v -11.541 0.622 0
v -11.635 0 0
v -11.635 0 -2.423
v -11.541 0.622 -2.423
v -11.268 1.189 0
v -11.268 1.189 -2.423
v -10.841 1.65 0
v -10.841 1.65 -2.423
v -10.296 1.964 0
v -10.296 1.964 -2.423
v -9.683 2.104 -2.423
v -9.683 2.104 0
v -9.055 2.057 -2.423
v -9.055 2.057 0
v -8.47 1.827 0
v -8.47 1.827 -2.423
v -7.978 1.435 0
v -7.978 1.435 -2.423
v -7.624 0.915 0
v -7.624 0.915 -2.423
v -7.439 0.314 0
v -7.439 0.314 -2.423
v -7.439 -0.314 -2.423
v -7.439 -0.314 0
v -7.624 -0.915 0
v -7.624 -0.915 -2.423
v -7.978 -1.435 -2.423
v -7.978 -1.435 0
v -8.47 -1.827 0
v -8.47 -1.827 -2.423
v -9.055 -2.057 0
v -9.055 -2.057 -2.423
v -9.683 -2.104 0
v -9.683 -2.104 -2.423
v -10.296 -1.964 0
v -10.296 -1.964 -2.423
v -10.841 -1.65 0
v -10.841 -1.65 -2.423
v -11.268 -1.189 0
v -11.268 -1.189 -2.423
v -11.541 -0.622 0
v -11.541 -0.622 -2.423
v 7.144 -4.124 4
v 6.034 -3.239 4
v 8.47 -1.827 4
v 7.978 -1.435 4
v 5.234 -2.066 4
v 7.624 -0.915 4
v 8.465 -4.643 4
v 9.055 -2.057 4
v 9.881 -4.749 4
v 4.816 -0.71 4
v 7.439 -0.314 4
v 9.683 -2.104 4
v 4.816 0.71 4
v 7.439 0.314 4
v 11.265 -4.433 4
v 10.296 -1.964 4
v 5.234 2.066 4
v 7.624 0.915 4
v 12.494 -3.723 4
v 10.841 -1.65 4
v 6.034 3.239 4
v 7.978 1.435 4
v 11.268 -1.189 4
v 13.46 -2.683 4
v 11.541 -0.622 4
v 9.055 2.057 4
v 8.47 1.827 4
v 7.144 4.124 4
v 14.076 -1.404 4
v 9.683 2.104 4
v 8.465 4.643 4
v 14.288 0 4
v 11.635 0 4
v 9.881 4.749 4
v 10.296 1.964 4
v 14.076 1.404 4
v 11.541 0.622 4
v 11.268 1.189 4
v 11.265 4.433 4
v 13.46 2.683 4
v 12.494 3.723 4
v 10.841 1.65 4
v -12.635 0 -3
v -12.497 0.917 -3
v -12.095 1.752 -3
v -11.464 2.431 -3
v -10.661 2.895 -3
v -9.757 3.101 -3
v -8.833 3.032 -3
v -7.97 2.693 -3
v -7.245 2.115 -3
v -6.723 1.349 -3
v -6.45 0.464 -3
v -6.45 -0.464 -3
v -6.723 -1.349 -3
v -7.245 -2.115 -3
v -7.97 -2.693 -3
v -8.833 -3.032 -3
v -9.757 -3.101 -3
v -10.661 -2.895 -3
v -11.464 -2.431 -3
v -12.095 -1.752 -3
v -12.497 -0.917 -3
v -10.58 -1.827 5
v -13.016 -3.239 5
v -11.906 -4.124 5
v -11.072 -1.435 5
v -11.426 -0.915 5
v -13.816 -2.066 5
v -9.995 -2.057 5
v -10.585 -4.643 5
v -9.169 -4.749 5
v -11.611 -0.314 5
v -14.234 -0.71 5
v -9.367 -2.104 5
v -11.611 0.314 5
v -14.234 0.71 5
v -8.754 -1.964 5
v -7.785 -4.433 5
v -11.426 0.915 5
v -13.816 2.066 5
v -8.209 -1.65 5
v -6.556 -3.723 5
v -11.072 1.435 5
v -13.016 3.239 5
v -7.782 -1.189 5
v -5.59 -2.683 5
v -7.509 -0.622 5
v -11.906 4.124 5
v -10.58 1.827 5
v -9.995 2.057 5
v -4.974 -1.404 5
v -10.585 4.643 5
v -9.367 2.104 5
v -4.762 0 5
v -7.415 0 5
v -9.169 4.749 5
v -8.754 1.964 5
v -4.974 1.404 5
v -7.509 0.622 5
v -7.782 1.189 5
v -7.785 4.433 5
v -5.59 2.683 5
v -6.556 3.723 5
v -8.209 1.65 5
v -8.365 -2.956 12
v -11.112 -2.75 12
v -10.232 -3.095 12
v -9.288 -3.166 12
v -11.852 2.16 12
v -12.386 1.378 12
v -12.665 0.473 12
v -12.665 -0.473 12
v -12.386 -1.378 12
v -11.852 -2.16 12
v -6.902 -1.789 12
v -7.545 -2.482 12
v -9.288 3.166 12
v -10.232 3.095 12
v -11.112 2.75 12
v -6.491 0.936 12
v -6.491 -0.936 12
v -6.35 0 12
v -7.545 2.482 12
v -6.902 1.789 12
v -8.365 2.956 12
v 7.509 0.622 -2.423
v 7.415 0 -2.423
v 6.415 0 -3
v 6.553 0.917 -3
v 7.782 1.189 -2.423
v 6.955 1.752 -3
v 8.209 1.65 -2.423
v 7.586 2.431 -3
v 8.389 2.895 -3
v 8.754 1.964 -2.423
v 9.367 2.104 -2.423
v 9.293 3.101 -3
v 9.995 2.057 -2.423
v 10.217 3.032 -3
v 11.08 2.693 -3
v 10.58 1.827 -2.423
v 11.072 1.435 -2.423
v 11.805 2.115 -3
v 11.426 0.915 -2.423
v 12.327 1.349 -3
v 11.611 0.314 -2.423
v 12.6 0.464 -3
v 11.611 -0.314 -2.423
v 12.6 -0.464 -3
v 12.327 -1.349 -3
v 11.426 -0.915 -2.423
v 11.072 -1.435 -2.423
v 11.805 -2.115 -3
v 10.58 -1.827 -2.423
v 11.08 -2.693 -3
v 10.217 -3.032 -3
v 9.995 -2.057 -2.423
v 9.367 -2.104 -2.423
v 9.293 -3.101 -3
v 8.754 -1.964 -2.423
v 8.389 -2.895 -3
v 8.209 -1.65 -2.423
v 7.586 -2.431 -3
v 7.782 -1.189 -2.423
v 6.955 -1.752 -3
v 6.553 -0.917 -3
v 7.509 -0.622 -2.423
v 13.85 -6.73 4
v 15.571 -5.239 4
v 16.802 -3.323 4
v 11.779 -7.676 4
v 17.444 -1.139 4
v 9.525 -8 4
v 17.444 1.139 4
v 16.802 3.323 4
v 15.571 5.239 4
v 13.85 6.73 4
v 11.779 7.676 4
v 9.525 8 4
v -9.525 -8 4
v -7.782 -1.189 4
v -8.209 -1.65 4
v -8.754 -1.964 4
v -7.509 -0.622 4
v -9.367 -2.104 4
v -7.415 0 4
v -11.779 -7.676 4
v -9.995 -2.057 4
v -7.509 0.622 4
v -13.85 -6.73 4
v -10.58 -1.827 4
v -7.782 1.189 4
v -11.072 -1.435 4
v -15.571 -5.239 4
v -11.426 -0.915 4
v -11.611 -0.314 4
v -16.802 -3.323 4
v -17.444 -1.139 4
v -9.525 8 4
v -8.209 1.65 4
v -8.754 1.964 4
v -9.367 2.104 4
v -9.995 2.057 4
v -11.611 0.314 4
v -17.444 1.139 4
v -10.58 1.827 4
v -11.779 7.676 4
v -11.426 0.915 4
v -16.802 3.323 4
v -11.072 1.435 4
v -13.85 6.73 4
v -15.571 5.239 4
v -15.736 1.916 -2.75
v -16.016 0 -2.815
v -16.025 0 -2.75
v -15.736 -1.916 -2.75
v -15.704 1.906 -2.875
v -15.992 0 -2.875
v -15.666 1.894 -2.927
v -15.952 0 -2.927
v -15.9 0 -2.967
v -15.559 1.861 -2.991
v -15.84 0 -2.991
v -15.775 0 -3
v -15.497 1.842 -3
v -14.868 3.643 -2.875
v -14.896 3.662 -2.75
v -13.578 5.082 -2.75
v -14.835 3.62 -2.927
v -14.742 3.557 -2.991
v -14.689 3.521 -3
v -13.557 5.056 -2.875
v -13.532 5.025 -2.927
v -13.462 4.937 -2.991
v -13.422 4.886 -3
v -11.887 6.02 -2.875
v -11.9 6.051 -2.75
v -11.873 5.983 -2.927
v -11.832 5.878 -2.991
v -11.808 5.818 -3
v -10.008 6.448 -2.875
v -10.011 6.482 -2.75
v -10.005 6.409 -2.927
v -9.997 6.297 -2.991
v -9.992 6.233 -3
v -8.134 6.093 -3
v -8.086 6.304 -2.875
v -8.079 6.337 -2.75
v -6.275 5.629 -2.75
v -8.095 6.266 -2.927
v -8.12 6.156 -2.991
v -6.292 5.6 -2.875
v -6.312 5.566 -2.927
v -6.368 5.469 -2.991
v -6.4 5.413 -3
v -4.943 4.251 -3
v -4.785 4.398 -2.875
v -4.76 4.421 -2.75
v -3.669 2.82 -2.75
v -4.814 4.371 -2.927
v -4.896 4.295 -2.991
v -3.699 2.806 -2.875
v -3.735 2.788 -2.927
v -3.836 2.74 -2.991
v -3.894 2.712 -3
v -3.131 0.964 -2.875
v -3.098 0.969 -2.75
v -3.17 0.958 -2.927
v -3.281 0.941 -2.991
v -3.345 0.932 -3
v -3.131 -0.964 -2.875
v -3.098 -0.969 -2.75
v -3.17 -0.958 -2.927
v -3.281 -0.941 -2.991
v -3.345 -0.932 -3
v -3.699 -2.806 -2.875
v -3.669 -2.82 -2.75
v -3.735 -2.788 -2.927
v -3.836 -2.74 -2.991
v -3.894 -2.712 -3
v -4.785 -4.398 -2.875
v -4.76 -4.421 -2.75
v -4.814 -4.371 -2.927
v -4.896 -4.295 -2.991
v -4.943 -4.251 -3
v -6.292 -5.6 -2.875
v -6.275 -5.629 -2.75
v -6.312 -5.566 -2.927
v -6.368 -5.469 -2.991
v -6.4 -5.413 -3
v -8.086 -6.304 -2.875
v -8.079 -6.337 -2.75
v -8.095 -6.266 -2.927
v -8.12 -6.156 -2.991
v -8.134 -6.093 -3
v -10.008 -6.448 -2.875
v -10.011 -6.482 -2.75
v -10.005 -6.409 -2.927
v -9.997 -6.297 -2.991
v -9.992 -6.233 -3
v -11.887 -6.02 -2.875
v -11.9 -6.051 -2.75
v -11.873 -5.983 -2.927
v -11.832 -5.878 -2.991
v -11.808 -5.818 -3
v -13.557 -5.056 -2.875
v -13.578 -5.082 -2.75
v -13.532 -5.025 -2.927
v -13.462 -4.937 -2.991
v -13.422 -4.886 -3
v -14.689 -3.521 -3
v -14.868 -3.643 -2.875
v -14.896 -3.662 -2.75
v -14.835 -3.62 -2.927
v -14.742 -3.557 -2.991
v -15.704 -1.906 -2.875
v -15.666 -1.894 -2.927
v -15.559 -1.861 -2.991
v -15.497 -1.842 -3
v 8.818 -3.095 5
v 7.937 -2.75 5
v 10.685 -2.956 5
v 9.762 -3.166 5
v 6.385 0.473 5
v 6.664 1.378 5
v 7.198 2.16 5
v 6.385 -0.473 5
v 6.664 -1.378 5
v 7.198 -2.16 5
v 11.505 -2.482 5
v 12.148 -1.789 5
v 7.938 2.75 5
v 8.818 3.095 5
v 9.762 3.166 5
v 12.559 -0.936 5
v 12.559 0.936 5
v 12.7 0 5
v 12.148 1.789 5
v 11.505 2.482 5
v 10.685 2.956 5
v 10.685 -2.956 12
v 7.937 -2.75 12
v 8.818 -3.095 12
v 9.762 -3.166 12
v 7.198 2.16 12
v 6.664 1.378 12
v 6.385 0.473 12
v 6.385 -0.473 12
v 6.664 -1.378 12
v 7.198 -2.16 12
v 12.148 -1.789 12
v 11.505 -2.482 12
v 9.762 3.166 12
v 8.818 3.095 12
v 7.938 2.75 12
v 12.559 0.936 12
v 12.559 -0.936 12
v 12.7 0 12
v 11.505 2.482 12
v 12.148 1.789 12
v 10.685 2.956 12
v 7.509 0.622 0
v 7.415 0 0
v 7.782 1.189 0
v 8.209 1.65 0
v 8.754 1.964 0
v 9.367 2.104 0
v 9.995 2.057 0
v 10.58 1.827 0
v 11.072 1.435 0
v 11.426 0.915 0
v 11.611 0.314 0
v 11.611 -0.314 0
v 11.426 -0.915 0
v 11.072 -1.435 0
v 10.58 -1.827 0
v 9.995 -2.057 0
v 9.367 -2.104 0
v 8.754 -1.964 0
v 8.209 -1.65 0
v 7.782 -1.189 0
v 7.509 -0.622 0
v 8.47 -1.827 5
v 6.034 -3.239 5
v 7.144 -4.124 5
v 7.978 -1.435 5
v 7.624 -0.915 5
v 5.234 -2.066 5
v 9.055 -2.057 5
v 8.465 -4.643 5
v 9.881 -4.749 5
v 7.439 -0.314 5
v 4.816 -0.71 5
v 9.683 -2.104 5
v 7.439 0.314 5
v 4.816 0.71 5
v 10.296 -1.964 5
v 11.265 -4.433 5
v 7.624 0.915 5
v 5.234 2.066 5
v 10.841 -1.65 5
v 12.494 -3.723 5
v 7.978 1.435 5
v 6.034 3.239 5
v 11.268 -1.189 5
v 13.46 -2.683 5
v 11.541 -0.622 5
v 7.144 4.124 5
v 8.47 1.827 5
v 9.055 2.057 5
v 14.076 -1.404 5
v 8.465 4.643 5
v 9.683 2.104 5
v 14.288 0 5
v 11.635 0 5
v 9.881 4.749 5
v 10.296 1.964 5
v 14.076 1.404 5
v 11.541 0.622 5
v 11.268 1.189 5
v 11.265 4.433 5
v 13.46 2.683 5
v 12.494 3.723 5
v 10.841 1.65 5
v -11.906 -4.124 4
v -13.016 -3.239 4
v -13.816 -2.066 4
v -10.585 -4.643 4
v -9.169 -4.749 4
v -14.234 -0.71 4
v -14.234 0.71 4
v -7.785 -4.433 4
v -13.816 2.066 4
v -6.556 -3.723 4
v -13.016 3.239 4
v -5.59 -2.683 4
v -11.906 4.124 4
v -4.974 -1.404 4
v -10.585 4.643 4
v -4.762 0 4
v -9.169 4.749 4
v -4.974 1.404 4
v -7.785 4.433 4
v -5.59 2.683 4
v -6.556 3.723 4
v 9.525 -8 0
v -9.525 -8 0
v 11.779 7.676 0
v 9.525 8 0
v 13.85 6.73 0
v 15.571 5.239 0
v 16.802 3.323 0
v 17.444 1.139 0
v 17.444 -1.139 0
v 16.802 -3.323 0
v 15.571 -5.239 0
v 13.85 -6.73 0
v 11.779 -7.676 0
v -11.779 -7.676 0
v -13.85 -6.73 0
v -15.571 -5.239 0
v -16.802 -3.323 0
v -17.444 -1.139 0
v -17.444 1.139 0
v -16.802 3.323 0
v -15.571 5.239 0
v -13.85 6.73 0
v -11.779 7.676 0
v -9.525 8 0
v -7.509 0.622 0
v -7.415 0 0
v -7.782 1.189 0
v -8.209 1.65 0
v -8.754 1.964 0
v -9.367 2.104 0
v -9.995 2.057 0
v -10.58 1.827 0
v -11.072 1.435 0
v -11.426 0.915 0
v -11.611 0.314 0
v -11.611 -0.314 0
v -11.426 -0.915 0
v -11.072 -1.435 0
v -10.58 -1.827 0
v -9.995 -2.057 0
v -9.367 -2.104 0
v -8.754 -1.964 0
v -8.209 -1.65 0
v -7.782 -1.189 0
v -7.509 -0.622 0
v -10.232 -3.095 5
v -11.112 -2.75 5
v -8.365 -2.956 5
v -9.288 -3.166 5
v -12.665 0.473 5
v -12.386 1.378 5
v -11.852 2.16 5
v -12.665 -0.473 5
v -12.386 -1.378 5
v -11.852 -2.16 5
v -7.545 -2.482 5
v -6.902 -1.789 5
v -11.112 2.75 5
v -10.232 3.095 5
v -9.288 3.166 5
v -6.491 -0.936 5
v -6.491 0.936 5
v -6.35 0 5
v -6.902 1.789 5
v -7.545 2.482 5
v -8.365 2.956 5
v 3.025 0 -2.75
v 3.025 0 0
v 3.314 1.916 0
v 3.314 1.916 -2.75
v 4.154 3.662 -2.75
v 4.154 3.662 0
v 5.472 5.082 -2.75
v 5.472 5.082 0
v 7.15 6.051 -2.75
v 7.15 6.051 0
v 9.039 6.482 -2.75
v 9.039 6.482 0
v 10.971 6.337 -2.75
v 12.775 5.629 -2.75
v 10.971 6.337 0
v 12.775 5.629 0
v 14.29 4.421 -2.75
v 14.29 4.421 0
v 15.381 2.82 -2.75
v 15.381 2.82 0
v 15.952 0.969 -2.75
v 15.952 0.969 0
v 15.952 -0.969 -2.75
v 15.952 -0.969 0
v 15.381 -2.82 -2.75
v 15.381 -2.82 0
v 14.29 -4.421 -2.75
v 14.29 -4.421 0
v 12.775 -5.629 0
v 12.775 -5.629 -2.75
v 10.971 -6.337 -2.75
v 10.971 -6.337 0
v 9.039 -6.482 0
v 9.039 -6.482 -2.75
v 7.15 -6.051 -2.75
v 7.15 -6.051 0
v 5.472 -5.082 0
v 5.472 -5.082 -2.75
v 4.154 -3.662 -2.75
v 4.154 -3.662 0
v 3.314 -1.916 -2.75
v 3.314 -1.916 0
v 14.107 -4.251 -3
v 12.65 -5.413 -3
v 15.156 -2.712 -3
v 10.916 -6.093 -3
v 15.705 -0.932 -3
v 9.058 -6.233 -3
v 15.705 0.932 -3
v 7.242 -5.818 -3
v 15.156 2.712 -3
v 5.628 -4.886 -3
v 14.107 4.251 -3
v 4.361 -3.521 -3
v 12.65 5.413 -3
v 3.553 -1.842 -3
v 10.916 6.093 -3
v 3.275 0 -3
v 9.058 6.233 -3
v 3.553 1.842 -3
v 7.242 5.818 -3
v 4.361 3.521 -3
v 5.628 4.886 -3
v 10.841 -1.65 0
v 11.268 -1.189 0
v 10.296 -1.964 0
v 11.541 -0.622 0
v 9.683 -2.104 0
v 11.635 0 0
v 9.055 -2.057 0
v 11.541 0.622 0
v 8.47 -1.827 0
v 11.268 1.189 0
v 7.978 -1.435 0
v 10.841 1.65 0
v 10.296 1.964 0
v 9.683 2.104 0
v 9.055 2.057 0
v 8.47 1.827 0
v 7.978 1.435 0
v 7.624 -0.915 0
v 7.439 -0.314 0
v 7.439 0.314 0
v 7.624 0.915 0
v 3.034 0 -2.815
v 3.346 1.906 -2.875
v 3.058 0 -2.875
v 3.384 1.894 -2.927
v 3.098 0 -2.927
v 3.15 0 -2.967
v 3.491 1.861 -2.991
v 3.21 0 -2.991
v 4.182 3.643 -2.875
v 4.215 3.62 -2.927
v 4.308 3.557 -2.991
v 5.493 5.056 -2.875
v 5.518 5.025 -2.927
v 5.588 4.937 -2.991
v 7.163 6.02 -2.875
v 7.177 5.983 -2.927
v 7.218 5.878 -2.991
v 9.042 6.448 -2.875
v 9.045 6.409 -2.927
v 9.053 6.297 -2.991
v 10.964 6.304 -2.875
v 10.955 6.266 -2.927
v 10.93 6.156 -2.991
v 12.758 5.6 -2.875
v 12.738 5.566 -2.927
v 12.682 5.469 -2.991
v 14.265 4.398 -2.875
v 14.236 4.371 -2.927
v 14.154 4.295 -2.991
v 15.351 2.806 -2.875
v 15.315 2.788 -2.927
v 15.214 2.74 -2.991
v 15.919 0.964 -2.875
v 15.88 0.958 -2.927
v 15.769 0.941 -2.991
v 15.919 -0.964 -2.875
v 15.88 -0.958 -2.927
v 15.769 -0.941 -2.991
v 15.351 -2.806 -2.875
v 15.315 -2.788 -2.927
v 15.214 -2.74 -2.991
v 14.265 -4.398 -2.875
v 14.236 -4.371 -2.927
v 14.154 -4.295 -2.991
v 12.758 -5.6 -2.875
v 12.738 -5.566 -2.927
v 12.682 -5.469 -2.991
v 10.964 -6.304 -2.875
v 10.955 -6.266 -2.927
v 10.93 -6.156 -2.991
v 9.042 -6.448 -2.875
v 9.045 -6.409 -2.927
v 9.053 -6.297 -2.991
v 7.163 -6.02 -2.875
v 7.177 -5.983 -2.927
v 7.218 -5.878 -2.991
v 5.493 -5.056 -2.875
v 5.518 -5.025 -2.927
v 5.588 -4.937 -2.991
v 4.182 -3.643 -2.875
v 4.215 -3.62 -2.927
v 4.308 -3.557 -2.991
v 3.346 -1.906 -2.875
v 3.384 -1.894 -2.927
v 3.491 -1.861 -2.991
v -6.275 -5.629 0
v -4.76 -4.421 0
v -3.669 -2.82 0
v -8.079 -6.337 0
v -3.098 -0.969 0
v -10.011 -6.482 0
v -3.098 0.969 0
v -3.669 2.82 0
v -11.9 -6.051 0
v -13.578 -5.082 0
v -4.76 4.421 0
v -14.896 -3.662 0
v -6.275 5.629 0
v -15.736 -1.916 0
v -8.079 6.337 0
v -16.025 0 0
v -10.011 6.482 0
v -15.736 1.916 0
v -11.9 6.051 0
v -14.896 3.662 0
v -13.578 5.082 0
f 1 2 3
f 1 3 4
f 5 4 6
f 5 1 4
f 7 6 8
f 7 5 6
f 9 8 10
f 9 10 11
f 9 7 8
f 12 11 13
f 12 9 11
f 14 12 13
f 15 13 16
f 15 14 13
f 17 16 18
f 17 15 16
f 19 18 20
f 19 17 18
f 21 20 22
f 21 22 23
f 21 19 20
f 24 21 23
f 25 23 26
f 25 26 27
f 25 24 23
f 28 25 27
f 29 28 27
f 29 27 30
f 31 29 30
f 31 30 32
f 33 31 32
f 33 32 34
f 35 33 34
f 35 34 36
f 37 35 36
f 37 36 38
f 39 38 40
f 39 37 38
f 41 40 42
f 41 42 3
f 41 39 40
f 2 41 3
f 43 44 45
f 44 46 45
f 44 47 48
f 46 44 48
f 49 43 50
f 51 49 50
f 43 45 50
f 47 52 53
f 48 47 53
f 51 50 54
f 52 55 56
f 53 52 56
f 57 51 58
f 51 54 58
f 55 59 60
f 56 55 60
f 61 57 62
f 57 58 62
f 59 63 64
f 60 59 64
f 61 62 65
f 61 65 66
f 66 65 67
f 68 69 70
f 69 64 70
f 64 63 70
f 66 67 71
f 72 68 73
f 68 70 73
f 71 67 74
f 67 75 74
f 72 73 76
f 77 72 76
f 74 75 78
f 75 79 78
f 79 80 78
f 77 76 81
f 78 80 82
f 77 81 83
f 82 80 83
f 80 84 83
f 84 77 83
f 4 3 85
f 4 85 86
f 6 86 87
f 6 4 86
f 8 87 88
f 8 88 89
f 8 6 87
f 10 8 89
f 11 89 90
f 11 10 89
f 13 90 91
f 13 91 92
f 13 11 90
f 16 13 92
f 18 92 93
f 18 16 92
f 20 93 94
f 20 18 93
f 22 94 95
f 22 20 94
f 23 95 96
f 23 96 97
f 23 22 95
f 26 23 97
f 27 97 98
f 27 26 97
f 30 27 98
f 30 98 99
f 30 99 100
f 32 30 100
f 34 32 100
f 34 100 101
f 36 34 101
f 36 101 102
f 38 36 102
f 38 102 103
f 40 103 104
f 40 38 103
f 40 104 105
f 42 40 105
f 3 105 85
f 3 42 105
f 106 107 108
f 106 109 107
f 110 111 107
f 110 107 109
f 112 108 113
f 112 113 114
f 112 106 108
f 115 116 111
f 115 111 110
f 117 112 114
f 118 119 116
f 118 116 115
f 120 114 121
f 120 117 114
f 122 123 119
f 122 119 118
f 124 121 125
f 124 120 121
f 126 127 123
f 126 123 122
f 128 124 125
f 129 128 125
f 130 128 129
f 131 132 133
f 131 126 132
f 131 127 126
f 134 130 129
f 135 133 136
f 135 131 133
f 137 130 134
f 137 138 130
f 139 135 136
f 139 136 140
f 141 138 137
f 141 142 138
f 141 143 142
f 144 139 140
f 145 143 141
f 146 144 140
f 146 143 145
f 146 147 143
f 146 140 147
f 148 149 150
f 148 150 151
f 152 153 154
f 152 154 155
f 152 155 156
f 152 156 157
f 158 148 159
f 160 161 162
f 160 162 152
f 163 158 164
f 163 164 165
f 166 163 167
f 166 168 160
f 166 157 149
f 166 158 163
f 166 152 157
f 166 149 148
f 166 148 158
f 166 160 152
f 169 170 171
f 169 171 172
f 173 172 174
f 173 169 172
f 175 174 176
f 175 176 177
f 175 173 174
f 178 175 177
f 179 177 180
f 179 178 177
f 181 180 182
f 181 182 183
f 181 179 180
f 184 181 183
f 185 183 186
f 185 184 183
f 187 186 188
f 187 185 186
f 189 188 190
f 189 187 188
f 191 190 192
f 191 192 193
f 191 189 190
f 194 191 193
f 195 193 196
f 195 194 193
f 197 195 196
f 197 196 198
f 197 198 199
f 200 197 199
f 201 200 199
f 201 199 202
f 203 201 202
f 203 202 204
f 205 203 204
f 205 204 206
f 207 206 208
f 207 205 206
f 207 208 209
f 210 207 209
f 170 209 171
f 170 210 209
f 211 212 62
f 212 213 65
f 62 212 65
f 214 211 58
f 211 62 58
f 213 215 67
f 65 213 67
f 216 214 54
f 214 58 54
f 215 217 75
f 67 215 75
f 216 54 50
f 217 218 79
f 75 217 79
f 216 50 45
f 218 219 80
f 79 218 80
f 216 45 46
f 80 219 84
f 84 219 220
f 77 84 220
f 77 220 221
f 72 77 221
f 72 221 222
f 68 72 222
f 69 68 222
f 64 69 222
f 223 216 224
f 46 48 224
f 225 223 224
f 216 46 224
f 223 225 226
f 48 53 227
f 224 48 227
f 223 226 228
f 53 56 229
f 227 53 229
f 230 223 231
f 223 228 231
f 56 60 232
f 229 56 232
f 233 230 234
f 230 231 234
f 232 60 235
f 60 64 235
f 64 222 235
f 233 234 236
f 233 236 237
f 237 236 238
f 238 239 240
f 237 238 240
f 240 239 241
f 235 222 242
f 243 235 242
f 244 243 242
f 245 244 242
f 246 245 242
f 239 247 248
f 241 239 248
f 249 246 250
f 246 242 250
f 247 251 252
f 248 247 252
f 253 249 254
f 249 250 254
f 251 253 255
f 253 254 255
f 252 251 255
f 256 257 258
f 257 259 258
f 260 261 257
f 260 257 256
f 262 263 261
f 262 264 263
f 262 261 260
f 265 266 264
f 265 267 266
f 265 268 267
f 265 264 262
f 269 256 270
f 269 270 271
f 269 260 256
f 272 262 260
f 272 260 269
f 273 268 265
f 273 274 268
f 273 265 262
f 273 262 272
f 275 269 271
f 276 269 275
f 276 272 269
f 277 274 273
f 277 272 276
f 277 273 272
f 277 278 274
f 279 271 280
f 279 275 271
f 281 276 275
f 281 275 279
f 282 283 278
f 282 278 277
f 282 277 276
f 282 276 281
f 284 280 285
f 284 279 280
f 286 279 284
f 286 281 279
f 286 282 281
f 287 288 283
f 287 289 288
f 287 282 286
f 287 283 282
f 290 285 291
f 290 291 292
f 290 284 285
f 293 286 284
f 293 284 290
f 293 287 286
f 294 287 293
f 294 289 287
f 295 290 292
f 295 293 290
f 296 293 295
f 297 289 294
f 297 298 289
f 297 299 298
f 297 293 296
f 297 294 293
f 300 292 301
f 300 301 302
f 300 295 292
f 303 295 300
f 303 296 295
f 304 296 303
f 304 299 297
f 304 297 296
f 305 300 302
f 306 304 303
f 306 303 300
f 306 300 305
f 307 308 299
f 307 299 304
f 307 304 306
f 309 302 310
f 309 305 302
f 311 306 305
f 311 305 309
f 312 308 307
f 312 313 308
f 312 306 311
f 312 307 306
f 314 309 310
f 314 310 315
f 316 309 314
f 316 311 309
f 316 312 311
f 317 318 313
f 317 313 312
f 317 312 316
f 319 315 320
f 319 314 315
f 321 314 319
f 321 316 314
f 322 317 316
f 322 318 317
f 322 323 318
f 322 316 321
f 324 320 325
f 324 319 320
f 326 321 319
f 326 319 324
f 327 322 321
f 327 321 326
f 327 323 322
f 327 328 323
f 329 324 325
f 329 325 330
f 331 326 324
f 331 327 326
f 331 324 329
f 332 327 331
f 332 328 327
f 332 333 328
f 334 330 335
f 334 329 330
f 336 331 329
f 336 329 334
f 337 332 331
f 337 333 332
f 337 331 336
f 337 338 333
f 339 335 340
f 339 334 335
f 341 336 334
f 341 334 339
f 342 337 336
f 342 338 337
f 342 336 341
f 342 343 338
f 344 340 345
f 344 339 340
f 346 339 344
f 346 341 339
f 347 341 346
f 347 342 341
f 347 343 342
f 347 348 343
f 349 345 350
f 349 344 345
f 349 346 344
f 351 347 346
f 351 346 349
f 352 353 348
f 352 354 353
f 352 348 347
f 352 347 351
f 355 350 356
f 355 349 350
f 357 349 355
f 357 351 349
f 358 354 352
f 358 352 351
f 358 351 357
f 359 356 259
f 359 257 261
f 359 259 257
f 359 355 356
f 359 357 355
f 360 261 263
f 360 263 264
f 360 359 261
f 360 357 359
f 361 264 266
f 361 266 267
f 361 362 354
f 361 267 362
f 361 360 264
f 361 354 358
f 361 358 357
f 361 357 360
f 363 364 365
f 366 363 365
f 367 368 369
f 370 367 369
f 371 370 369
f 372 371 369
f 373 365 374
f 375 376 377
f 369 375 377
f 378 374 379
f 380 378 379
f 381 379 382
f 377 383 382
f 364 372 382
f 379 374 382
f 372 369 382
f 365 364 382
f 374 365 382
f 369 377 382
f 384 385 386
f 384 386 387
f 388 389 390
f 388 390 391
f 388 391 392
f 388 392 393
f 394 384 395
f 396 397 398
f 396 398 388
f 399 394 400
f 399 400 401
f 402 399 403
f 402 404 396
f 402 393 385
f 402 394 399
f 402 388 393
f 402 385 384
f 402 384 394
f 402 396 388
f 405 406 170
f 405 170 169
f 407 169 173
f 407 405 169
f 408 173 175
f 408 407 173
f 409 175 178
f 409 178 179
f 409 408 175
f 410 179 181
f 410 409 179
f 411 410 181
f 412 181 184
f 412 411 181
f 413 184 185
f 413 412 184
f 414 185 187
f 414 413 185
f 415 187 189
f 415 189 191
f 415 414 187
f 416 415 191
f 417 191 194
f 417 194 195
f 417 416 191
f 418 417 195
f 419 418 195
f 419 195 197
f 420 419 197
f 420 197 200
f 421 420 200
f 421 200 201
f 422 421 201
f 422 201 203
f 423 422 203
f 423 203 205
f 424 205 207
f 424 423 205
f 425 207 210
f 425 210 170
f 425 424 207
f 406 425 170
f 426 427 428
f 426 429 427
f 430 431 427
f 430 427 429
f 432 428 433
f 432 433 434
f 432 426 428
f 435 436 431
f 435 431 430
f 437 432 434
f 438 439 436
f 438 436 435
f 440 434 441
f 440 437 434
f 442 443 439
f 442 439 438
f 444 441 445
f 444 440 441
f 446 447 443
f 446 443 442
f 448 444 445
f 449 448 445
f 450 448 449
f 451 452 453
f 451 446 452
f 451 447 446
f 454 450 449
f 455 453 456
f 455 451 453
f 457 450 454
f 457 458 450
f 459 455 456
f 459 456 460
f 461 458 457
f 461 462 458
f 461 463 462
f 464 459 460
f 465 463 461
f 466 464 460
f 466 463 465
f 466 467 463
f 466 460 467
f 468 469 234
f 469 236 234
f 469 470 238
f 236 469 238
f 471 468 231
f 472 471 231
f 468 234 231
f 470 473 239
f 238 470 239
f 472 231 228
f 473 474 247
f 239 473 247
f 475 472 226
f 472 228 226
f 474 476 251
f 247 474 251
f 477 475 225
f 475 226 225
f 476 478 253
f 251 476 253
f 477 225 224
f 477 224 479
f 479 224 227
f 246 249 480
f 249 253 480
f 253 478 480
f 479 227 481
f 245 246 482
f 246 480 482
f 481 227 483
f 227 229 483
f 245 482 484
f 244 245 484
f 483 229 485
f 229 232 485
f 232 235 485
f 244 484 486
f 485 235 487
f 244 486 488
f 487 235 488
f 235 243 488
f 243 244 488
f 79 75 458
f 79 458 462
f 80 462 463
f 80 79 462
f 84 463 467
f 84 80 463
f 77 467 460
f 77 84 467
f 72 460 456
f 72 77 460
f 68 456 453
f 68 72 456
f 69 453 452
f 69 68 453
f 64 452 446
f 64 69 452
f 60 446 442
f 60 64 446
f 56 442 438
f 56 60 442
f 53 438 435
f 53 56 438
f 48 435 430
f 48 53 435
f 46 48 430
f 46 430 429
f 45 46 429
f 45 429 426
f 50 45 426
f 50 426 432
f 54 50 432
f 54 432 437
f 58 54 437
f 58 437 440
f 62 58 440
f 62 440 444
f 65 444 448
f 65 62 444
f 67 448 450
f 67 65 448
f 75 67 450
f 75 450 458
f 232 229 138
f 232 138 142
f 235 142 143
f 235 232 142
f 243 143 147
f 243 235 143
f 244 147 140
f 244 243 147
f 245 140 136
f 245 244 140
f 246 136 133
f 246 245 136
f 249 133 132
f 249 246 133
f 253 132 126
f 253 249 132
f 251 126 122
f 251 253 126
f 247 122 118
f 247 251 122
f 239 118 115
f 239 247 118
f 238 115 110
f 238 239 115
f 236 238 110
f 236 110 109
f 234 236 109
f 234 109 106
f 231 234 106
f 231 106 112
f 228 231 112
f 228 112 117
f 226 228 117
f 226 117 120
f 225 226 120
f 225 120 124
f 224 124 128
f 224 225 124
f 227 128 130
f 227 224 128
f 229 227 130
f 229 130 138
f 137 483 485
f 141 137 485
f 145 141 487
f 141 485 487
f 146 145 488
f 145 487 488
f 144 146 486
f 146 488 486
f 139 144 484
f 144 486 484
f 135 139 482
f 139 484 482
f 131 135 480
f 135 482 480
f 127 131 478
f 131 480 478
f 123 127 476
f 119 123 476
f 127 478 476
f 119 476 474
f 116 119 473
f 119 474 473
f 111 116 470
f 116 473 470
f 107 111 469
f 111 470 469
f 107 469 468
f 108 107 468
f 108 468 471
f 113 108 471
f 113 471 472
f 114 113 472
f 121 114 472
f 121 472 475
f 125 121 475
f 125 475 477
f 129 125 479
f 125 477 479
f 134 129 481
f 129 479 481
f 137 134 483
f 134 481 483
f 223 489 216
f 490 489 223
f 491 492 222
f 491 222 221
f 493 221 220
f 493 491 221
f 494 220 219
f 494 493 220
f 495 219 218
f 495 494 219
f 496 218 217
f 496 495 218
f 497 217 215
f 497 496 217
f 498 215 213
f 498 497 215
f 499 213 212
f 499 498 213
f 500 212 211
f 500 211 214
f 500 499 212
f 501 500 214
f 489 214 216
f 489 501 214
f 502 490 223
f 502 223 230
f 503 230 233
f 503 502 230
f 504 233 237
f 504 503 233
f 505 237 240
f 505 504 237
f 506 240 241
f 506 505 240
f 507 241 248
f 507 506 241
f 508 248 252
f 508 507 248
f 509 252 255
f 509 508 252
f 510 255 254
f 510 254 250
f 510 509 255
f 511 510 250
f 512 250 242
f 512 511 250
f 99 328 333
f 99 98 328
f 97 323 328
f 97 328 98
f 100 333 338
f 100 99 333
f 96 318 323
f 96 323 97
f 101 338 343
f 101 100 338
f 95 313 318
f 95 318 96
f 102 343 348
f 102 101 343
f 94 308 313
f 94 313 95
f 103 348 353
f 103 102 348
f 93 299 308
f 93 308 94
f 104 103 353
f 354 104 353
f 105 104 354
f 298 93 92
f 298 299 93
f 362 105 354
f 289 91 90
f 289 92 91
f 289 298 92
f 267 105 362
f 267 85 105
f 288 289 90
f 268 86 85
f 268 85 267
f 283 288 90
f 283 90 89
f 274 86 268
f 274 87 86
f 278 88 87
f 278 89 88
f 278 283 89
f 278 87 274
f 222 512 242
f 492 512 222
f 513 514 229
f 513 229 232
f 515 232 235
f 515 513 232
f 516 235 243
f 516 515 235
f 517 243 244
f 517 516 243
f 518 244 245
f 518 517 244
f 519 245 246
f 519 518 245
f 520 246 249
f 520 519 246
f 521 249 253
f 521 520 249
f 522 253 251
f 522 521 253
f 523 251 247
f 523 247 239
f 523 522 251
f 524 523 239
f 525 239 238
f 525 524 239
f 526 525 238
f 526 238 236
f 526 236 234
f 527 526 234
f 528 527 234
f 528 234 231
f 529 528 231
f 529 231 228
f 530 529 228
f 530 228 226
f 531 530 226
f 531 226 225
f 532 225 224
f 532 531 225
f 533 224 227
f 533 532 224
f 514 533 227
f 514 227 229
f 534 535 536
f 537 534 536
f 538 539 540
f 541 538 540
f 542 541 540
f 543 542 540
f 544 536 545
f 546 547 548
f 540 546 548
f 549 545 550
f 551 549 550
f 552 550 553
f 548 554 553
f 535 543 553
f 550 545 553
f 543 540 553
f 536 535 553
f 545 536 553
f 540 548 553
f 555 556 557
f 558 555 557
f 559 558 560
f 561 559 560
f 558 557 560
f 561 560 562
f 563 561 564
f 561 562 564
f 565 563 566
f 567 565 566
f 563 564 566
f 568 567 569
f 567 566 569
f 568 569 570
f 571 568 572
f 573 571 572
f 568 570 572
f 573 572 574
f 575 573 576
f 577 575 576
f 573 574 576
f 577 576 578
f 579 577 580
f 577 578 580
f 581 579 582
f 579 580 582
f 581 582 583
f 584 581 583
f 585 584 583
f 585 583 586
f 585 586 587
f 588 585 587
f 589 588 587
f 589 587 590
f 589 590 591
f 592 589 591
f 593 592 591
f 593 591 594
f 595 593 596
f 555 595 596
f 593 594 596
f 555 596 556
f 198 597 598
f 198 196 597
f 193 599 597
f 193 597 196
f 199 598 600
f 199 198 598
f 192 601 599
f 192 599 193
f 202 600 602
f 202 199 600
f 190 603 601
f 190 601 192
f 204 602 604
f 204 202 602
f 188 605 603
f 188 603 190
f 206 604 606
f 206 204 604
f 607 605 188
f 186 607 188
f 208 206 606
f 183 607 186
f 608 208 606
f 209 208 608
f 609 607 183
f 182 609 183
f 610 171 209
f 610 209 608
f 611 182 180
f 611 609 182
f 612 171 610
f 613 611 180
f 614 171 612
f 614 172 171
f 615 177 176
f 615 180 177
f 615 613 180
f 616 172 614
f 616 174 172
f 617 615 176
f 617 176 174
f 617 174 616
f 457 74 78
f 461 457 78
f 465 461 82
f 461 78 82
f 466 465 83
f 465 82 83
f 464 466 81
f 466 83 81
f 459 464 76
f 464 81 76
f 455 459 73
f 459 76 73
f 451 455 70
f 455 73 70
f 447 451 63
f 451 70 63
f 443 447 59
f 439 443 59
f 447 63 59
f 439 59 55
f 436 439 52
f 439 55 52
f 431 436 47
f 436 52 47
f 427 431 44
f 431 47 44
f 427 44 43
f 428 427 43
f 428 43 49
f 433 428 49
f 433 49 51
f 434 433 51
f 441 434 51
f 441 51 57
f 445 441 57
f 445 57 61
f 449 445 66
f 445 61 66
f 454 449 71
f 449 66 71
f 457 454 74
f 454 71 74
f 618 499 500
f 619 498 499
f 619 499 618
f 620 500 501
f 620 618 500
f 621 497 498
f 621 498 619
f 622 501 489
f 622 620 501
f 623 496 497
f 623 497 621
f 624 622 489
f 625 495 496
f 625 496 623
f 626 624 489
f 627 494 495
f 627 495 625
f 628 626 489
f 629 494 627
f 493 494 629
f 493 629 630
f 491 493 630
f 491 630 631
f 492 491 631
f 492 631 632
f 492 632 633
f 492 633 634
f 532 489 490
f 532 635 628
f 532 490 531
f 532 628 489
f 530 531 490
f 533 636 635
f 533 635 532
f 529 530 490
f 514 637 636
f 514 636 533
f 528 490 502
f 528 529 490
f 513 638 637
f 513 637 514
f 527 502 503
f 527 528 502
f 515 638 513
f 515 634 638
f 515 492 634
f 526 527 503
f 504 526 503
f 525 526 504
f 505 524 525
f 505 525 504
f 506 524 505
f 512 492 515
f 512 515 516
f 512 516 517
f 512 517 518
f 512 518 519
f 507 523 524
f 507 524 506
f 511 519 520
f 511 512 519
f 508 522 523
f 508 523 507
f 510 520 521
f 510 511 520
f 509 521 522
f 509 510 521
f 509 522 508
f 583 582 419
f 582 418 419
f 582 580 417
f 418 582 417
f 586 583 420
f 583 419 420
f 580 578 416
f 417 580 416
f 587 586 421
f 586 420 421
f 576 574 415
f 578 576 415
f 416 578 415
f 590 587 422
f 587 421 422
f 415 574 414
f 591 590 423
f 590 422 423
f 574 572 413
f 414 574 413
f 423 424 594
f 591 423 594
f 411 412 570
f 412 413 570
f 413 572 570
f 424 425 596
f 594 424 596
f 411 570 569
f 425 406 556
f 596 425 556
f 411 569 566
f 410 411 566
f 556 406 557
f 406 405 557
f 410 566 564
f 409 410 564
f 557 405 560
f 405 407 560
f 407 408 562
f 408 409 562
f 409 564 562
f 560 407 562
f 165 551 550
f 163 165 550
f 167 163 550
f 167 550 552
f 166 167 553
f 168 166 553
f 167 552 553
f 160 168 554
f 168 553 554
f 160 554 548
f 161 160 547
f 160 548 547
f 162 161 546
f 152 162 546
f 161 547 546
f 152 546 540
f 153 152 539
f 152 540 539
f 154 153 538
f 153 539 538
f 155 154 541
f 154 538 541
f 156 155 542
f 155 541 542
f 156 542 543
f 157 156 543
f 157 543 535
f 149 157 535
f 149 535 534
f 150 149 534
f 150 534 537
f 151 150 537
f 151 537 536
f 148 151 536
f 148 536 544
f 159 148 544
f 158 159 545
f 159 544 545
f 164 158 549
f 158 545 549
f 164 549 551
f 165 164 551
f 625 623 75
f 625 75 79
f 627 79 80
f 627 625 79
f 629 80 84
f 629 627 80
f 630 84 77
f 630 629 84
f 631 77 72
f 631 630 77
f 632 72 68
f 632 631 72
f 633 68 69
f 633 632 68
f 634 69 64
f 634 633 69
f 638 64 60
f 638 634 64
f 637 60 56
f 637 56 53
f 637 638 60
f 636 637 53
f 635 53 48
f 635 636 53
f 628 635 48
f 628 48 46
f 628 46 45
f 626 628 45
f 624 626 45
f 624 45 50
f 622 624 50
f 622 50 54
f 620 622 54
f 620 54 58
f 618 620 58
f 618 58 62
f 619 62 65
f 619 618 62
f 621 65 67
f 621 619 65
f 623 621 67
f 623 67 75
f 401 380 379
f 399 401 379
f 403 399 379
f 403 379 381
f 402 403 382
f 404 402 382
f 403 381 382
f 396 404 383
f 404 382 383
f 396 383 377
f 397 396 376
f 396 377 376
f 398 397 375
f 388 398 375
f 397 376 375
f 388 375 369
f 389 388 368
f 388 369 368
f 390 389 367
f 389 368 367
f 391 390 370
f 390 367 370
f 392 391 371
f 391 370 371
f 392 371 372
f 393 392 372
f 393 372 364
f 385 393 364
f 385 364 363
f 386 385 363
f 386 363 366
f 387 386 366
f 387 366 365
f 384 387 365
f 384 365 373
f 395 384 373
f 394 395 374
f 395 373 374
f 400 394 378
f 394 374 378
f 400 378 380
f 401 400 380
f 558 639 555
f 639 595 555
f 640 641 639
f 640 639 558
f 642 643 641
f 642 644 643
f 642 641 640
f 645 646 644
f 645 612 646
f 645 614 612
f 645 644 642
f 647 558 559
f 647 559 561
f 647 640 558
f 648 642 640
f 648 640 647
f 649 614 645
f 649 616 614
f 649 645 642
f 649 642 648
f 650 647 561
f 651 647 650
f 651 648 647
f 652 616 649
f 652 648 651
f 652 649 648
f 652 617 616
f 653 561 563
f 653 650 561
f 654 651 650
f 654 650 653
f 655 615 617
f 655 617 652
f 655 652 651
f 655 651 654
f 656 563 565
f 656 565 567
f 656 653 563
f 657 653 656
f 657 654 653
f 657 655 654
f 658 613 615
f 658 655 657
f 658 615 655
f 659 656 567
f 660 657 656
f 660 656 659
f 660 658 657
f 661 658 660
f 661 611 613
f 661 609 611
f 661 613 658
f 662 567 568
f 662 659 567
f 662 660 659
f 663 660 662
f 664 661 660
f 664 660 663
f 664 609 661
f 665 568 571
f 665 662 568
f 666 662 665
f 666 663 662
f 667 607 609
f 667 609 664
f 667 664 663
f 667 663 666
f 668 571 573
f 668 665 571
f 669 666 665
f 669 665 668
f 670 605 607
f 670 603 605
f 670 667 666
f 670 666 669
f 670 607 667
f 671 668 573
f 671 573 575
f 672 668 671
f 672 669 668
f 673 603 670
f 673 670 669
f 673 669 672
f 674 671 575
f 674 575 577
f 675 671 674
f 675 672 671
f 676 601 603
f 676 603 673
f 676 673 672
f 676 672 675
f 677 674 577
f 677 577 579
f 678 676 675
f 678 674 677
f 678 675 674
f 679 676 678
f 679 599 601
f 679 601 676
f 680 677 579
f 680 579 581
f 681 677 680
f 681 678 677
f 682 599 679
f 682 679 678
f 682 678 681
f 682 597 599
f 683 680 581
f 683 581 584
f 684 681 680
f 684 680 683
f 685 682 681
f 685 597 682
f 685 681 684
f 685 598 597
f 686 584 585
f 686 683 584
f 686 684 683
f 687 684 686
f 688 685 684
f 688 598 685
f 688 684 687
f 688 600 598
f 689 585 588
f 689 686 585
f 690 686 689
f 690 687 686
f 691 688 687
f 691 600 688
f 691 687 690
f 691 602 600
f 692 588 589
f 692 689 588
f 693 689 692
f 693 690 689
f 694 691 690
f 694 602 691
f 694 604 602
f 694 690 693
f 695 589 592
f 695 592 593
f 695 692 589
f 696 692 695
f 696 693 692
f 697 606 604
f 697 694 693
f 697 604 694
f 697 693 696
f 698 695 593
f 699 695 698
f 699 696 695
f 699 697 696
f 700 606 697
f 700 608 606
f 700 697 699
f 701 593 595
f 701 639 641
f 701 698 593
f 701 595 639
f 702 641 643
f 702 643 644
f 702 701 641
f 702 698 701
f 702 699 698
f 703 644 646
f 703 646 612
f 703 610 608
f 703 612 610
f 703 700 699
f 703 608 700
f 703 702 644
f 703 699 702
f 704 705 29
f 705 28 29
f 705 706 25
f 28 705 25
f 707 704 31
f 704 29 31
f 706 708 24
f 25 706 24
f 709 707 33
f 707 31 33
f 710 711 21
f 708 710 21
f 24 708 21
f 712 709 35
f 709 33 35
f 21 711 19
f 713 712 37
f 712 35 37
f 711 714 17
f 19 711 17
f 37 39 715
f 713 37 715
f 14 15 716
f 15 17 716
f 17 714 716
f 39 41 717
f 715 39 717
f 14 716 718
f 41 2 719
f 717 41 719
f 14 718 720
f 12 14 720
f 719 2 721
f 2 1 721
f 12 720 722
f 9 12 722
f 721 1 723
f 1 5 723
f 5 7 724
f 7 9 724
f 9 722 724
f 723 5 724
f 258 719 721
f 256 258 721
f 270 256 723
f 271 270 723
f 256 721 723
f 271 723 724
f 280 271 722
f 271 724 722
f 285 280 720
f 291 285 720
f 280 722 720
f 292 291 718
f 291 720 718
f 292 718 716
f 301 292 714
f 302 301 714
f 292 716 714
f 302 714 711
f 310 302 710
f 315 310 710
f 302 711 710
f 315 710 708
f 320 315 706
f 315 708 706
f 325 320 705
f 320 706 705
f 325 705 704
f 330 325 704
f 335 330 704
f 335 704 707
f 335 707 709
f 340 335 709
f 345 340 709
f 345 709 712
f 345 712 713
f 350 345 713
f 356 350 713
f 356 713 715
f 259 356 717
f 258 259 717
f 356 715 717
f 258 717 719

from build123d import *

# Parameters (mm, degrees)
SKETCH1_R             = 2.11
BOSS_EXTRUDE1_DEPTH   = 4
SKETCH2_R             = 6.5
SKETCH2_R_2           = 2.11
BOSS_EXTRUDE2_DEPTH   = 3
BOSS_EXTRUDE2_2_DEPTH = 3
FILLET1_R             = 0.25
CHAMFER1_SIZE         = 1
CHAMFER1_SIZE2        = 0.577350269
SKETCH3_R             = 4.7625
SKETCH3_R_2           = 2.11
BOSS_EXTRUDE3_DEPTH   = 1
BOSS_EXTRUDE3_2_DEPTH = 1
SKETCH4_R             = 3.175
BOSS_EXTRUDE4_DEPTH   = 7
BOSS_EXTRUDE4_2_DEPTH = 7
FILLET2_R             = 0.25
CHAMFER2_SIZE         = 1
CHAMFER2_SIZE2        = 0.577350269


with BuildPart() as part:
    # Sketch1 → Boss-Extrude1 (new body)
    with BuildSketch(Plane.XY):
        with BuildLine():
            Line((-9.525, 8), (9.525, 8))
            ThreePointArc((9.525, 8), (17.525, 0), (9.525, -8))
            Line((9.525, -8), (-9.525, -8))
            ThreePointArc((-9.525, -8), (-17.525, 0), (-9.525, 8))
        make_face()
        with Locations((-9.525, 0)):
            Circle(SKETCH1_R, mode=Mode.SUBTRACT)
        with Locations((9.525, 0)):
            Circle(SKETCH1_R, mode=Mode.SUBTRACT)
    extrude(amount=BOSS_EXTRUDE1_DEPTH)


with BuildPart() as body_2:
    # Sketch2 → Boss-Extrude2 (new body)
    with BuildSketch(Plane(origin=(0, 0, 0), x_dir=(-1, 0, 0), z_dir=(0, 0, -1))):
        with Locations((-9.525, 0)):
            Circle(SKETCH2_R)
        with Locations((-9.525, 0)):
            Circle(SKETCH2_R_2, mode=Mode.SUBTRACT)
    extrude(amount=BOSS_EXTRUDE2_DEPTH)

    # Fillet2
    fillet2_edges = [body_2.edges().sort_by_distance(p)[0] for p in [
        (16.025, 0, -3),
    ]]
    fillet(fillet2_edges, radius=FILLET2_R)

    # Chamfer2
    chamfer2_edges = [body_2.edges().sort_by_distance(p)[0] for p in [
        (11.635, 0, -3),
    ]]
    chamfer2_side = [body_2.faces().sort_by_distance(p)[0] for p in [
        (15.598223305, 0, -3),
    ]]
    chamfer(chamfer2_edges, length=CHAMFER2_SIZE, length2=CHAMFER2_SIZE2, reference=chamfer2_side[0])


with BuildPart() as body_3:
    # Sketch2 → Boss-Extrude2 2 (new body)
    with BuildSketch(Plane(origin=(0, 0, 0), x_dir=(-1, 0, 0), z_dir=(0, 0, -1))):
        with Locations((9.525, 0)):
            Circle(SKETCH2_R)
        with Locations((9.525, 0)):
            Circle(SKETCH2_R_2, mode=Mode.SUBTRACT)
    extrude(amount=BOSS_EXTRUDE2_2_DEPTH)

    # Fillet1
    fillet1_edges = [body_3.edges().sort_by_distance(p)[0] for p in [
        (-3.025, 0, -3),
    ]]
    fillet(fillet1_edges, radius=FILLET1_R)

    # Chamfer1
    chamfer1_edges = [body_3.edges().sort_by_distance(p)[0] for p in [
        (-7.415, 0, -3),
    ]]
    chamfer1_side = [body_3.faces().sort_by_distance(p)[0] for p in [
        (-3.451776695, 0, -3),
    ]]
    chamfer(chamfer1_edges, length=CHAMFER1_SIZE, length2=CHAMFER1_SIZE2, reference=chamfer1_side[0])


with BuildPart() as body_4:
    # Sketch3 → Boss-Extrude3 (new body)
    with BuildSketch(Plane.XY.offset(4)):
        with Locations((-9.525, 0)):
            Circle(SKETCH3_R)
        with Locations((-9.525, 0)):
            Circle(SKETCH3_R_2, mode=Mode.SUBTRACT)
    extrude(amount=BOSS_EXTRUDE3_DEPTH)


with BuildPart() as body_5:
    # Sketch3 → Boss-Extrude3 2 (new body)
    with BuildSketch(Plane.XY.offset(4)):
        with Locations((9.525, 0)):
            Circle(SKETCH3_R)
        with Locations((9.525, 0)):
            Circle(SKETCH3_R_2, mode=Mode.SUBTRACT)
    extrude(amount=BOSS_EXTRUDE3_2_DEPTH)


with BuildPart() as body_6:
    # Sketch4 → Boss-Extrude4 (new body)
    with BuildSketch(Plane.XY.offset(5)):
        with Locations((-9.525, 0)):
            Circle(SKETCH4_R)
    extrude(amount=BOSS_EXTRUDE4_DEPTH)


with BuildPart() as body_7:
    # Sketch4 → Boss-Extrude4 2 (new body)
    with BuildSketch(Plane.XY.offset(5)):
        with Locations((9.525, 0)):
            Circle(SKETCH4_R)
    extrude(amount=BOSS_EXTRUDE4_2_DEPTH)


solid = Compound([part.part, body_2.part, body_3.part, body_4.part, body_5.part, body_6.part, body_7.part])
